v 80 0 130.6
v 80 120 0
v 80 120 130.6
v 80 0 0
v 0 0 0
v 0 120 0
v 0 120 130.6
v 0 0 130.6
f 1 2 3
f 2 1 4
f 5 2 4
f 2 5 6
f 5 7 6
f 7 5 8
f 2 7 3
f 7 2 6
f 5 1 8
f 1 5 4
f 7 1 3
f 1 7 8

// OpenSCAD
// Architectural thermal visualization; dimensions are scaled.
color([0.0315,0,0.9685,0.75]) translate([0,0,0.00000]) cube([80.00000,120.00000,18.00000]);
color([0.4048,0,0.5952,0.75]) translate([0,0,18.00000]) cube([80.00000,120.00000,10.00000]);
color([0.4039,0,0.5961,0.75]) translate([0,0,28.00000]) cube([80.00000,120.00000,10.00000]);
color([0.3957,0,0.6043,0.75]) translate([0,0,38.00000]) cube([80.00000,120.00000,1.50000]);
color([0.3848,0,0.6152,0.75]) translate([0,0,39.50000]) cube([80.00000,120.00000,3.20000]);
color([0.3726,0,0.6274,0.75]) translate([0,0,42.70000]) cube([80.00000,120.00000,1.50000]);
color([0.3568,0,0.6432,0.75]) translate([0,0,44.20000]) cube([80.00000,120.00000,3.20000]);
color([0.3404,0,0.6596,0.75]) translate([0,0,47.40000]) cube([80.00000,120.00000,1.50000]);
color([0.3208,0,0.6792,0.75]) translate([0,0,48.90000]) cube([80.00000,120.00000,3.20000]);
color([0.3013,0,0.6987,0.75]) translate([0,0,52.10000]) cube([80.00000,120.00000,1.50000]);
color([0.2794,0,0.7206,0.75]) translate([0,0,53.60000]) cube([80.00000,120.00000,3.20000]);
color([0.2584,0,0.7416,0.75]) translate([0,0,56.80000]) cube([80.00000,120.00000,1.50000]);
color([0.2879,0,0.7121,0.75]) translate([0,0,58.30000]) cube([80.00000,120.00000,3.20000]);
color([0.3794,0,0.6206,0.75]) translate([0,0,61.50000]) cube([80.00000,120.00000,1.50000]);
color([0.4727,0,0.5273,0.75]) translate([0,0,63.00000]) cube([80.00000,120.00000,3.20000]);
color([0.6126,0,0.3874,0.75]) translate([0,0,66.20000]) cube([80.00000,120.00000,1.50000]);
color([0.7421,0,0.2579,0.75]) translate([0,0,67.70000]) cube([80.00000,120.00000,3.20000]);
color([0.9092,0,0.0908,0.75]) translate([0,0,70.90000]) cube([80.00000,120.00000,1.50000]);
color([1.0000,0,0.0000,0.75]) translate([0,0,72.40000]) cube([80.00000,120.00000,3.20000]);
color([0.6447,0,0.3553,0.75]) translate([0,0,75.60000]) cube([80.00000,120.00000,5.00000]);
color([0.0315,0,0.9685,0.75]) translate([0,0,80.60000]) cube([80.00000,120.00000,50.00000]);
